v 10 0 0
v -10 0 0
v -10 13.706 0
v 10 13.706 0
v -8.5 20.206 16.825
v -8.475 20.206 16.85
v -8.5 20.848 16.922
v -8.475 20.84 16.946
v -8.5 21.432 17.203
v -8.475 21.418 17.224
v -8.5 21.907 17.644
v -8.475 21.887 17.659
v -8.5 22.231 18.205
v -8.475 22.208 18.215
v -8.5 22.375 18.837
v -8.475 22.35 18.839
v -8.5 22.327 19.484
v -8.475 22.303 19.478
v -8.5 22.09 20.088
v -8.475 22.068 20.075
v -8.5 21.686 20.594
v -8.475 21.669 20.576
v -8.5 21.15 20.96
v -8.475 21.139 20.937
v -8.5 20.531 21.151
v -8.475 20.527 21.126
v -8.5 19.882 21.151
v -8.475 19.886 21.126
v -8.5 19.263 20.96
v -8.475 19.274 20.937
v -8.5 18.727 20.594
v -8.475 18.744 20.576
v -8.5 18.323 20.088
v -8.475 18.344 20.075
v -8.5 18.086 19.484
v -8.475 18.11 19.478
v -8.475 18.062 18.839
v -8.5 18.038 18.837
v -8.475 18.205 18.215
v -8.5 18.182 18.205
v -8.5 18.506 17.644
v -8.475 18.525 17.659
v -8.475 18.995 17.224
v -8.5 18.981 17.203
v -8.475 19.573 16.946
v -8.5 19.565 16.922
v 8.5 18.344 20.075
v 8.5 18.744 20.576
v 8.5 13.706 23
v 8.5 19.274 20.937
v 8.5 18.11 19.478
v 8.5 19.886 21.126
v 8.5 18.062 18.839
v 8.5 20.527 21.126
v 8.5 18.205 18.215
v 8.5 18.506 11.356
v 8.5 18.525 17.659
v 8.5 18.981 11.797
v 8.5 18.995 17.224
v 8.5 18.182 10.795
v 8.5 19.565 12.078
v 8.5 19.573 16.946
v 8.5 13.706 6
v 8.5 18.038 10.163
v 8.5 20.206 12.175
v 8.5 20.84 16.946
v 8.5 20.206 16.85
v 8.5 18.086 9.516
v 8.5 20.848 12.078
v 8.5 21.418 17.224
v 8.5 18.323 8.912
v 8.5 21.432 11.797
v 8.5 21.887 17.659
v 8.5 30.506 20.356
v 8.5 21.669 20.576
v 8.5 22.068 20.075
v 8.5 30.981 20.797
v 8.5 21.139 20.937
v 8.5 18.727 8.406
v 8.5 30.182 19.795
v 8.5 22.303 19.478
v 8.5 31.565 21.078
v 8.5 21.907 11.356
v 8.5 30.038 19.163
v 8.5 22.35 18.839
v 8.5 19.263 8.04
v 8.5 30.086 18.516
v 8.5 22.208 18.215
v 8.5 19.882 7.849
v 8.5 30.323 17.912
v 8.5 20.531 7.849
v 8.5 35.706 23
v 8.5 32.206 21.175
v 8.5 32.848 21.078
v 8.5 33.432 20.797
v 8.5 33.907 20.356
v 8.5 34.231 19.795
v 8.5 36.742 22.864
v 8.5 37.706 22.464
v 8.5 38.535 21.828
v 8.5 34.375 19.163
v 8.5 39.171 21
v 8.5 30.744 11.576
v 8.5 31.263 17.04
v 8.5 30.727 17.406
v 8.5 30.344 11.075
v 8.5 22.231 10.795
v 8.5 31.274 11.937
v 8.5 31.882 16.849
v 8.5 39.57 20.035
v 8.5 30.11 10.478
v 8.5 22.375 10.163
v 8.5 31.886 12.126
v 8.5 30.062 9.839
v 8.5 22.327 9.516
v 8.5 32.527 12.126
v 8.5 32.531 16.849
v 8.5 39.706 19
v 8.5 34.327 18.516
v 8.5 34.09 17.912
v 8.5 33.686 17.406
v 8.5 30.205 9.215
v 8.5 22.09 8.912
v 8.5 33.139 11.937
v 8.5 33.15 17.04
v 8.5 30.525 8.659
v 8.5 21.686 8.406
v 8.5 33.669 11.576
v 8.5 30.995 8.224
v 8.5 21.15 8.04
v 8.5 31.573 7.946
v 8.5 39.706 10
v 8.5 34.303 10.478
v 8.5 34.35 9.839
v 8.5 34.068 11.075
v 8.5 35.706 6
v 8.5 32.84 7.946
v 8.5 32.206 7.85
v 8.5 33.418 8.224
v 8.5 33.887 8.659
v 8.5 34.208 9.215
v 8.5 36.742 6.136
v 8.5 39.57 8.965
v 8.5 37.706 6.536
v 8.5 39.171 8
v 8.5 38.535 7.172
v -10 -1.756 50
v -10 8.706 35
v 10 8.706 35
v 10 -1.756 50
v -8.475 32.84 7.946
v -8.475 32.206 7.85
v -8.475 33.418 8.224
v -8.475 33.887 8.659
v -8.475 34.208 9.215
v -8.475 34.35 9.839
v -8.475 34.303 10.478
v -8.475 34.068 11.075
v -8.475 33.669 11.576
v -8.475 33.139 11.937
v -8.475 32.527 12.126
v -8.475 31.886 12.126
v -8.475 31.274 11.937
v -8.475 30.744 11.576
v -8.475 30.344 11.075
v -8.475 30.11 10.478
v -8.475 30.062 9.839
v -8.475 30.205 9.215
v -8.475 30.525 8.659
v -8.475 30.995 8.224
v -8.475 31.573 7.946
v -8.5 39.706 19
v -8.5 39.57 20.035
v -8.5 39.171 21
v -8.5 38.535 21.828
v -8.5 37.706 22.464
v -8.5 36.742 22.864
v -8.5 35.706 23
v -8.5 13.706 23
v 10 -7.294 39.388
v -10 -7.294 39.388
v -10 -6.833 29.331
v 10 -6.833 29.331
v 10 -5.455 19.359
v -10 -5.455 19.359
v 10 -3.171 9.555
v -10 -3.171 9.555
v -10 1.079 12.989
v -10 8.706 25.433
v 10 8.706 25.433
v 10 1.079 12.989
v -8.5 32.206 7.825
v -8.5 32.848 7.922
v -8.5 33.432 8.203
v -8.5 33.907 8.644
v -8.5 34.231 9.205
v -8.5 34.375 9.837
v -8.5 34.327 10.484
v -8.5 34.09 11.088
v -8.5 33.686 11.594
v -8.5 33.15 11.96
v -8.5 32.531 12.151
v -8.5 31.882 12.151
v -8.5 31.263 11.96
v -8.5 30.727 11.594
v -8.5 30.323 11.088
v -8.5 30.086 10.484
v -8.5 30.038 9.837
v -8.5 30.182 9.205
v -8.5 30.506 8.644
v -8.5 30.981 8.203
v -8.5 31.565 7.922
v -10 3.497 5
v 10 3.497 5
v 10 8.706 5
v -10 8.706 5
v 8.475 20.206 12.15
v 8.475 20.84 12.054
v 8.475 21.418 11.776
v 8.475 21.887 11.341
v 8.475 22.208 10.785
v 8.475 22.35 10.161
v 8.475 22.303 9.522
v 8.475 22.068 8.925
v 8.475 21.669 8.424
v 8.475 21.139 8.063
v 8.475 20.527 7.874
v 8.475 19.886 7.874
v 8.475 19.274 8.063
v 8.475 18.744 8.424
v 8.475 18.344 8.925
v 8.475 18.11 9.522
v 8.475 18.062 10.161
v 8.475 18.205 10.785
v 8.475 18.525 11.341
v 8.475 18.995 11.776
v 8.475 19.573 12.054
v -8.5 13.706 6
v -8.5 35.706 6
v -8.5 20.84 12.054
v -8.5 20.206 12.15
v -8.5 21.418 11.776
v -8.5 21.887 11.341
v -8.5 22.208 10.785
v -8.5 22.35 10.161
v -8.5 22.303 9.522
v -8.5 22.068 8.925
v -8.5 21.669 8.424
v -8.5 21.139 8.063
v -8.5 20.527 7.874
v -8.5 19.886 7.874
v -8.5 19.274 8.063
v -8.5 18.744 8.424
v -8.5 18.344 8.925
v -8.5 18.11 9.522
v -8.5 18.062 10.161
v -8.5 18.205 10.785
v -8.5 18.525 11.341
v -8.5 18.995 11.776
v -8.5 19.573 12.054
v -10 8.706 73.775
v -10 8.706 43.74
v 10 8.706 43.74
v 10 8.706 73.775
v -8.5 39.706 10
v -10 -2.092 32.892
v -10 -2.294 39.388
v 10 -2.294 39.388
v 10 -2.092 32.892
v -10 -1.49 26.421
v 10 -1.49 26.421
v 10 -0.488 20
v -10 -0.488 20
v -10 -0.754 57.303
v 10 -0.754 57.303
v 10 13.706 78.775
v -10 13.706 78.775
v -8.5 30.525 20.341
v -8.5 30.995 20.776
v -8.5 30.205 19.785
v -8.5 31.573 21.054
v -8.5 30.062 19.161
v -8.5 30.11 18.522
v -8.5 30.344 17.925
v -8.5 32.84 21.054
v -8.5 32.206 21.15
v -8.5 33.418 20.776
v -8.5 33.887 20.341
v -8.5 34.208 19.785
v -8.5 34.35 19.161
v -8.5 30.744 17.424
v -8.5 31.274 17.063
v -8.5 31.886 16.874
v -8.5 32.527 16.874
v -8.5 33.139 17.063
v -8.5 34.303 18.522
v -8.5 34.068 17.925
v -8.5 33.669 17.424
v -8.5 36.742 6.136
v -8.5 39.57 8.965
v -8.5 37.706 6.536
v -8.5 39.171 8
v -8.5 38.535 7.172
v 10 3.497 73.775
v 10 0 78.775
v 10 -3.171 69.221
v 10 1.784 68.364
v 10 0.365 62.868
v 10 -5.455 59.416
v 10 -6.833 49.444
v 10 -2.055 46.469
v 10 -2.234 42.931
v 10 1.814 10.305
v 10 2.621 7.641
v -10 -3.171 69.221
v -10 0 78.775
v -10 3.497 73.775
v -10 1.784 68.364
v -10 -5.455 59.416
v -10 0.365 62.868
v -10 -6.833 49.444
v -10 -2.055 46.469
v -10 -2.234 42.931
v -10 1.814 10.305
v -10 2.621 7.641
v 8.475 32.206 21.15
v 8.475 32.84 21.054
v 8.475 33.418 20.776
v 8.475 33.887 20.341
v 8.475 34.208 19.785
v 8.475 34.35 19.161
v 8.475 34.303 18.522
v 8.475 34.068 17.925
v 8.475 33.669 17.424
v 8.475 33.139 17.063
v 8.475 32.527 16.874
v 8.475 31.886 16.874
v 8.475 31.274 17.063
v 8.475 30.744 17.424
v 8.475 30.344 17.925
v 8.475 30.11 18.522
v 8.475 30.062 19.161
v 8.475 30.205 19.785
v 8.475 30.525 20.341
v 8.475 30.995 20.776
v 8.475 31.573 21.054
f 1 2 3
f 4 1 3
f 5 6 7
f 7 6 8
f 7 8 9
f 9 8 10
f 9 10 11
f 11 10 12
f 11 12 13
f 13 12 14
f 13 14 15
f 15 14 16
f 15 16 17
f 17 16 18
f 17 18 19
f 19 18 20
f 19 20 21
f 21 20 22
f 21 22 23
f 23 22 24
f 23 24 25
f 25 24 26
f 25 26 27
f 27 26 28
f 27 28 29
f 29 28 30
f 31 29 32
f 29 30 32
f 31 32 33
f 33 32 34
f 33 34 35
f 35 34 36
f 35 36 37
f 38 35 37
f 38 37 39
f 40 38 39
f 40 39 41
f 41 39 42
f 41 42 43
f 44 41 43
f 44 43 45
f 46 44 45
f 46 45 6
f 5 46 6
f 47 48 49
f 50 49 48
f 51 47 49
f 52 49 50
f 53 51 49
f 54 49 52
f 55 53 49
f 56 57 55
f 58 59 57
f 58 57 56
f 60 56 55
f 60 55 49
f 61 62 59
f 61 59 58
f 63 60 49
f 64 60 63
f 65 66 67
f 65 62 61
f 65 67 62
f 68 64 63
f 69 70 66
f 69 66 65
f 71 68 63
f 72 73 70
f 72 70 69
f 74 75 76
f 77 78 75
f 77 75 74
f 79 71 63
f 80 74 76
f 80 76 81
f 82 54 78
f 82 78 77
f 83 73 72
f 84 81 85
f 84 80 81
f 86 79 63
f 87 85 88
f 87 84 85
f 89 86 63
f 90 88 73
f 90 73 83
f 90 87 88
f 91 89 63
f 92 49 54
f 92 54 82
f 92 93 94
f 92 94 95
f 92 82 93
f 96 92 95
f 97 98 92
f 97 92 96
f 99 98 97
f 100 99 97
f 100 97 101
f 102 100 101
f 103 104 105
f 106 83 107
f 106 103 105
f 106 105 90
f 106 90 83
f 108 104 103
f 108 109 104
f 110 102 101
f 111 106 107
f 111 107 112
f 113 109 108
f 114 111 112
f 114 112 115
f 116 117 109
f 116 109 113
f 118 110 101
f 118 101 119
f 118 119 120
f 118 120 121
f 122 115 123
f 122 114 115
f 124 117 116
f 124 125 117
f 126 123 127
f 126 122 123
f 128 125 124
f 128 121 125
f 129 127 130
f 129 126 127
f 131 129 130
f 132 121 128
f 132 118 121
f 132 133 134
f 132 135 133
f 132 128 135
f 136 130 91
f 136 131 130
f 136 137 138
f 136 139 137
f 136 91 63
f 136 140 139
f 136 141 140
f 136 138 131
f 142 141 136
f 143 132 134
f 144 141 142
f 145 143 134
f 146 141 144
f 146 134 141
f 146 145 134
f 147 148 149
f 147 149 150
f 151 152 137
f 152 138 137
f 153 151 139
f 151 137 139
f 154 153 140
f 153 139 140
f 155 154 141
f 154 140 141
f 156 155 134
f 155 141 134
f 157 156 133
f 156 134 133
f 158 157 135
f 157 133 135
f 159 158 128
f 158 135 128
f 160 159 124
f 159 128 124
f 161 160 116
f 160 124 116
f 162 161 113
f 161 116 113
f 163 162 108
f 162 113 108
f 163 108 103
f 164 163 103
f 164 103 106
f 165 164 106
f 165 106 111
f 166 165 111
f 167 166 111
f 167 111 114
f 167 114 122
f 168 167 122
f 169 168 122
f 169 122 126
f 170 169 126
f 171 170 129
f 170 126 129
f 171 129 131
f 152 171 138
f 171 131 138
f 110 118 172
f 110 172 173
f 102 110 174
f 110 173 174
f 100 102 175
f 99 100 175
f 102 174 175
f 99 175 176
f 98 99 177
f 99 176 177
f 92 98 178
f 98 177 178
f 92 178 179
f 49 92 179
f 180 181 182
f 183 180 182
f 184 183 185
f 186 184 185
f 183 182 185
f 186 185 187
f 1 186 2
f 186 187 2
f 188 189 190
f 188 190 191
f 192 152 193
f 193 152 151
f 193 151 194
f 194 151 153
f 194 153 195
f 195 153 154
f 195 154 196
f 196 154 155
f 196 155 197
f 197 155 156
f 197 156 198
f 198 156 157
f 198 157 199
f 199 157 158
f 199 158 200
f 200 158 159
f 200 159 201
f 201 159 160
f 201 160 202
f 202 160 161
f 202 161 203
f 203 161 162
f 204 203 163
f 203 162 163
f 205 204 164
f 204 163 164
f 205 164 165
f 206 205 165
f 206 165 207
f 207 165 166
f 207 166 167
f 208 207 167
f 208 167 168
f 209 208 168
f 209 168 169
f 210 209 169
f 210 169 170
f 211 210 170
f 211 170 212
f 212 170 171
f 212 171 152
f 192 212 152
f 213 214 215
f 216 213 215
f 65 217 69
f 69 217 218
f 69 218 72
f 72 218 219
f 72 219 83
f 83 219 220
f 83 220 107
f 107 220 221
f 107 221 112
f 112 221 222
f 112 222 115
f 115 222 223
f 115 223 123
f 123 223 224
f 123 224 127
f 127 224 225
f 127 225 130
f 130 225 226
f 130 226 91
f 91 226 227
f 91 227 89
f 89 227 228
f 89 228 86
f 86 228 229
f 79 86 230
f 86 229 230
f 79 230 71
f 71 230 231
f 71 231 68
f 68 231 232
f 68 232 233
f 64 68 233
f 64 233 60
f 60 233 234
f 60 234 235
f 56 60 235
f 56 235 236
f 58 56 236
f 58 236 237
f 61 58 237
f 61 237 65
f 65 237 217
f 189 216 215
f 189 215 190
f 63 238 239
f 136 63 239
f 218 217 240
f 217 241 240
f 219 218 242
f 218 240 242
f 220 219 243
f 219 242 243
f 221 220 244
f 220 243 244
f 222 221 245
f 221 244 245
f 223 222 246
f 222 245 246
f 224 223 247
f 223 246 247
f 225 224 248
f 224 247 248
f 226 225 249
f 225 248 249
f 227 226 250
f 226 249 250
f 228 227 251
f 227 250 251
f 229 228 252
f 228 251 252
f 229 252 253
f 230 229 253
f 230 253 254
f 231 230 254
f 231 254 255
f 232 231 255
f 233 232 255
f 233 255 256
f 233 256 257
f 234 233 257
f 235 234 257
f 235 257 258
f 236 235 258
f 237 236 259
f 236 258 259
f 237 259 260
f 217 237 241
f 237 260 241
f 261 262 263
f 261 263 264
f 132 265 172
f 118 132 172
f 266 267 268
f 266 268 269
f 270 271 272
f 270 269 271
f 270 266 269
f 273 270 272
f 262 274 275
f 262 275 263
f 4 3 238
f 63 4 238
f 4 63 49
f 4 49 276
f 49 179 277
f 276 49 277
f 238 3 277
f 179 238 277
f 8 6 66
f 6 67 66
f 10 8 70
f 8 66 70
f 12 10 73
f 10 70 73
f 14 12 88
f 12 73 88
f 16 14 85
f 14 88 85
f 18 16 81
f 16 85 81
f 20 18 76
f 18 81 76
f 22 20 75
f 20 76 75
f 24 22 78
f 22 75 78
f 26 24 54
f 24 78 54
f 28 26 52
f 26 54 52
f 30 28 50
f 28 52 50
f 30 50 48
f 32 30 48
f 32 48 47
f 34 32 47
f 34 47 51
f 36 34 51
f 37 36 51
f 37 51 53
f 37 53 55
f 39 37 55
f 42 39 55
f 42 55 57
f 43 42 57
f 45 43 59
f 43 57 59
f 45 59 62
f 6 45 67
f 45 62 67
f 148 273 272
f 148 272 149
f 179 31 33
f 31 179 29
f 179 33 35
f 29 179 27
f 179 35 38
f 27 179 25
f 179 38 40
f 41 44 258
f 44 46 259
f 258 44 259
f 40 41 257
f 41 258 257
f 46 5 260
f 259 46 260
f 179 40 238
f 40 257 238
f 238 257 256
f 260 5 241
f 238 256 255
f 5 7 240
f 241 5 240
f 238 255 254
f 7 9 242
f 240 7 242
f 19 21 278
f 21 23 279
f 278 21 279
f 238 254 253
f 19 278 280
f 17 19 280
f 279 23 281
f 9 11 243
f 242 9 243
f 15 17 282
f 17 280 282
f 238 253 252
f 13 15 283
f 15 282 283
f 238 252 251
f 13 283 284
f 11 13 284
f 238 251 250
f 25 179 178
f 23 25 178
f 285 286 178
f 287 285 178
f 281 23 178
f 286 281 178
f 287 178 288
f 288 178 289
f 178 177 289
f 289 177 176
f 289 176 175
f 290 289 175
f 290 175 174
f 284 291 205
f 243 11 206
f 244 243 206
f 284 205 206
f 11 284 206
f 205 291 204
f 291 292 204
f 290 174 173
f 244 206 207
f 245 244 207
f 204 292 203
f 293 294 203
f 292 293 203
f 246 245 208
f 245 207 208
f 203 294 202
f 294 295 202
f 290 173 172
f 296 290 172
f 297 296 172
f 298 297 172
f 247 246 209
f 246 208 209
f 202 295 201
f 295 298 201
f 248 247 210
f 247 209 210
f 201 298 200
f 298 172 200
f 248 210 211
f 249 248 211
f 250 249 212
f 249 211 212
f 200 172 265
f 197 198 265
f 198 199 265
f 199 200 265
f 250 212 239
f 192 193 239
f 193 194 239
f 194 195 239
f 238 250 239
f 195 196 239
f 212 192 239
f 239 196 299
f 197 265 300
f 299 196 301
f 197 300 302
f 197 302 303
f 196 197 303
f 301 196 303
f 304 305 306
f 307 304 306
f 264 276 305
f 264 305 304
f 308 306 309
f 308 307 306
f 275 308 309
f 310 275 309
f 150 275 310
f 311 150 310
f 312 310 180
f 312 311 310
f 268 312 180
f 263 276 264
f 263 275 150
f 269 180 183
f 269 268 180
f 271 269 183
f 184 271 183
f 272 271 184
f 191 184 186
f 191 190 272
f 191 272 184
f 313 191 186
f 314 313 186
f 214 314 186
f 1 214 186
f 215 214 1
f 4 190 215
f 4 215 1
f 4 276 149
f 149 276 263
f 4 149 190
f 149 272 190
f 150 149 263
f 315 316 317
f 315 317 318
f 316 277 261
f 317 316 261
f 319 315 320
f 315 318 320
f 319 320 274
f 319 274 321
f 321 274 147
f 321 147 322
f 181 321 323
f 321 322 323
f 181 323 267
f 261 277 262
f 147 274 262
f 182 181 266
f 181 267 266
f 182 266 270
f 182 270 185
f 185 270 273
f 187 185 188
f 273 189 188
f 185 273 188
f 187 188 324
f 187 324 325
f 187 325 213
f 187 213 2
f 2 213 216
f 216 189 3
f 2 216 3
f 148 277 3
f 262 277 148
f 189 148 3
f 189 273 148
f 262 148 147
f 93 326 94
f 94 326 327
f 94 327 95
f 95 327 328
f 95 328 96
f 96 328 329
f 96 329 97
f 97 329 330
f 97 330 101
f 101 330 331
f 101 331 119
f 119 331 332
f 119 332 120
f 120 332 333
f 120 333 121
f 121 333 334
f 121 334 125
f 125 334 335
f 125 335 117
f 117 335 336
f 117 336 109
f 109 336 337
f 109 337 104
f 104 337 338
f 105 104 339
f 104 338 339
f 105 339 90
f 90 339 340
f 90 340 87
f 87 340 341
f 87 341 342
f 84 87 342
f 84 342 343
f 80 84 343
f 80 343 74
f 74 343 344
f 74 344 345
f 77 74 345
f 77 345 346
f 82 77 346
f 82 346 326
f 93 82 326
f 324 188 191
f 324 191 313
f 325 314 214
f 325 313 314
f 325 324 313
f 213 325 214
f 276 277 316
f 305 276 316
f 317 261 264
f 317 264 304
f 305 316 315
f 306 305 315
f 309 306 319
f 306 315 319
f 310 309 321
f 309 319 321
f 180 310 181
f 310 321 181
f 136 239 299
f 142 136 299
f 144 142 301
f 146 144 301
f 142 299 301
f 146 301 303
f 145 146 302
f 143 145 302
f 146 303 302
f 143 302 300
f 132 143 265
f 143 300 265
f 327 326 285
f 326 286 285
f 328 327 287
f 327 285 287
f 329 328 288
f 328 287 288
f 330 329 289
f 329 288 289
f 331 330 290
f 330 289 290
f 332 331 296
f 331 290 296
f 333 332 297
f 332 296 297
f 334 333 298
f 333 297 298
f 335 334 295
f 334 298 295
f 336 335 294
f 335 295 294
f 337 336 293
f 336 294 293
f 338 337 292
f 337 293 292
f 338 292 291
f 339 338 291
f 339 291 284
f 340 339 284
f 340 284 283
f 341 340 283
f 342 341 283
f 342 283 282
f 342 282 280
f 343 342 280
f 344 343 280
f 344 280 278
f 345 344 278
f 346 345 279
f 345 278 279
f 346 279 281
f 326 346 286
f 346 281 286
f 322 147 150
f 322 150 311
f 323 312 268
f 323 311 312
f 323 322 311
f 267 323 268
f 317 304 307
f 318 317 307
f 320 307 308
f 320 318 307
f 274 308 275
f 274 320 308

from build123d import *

# Parameters (mm, degrees)
BOSS_EXTRUDE1_DEPTH            = 10
BOSS_EXTRUDE1_DEPTH_BACK       = 10
BOSS_EXTRUDE2_START            = -8.5
BOSS_EXTRUDE2_DEPTH            = 17
M4_CLEARANCE_HOLE1_D           = 4.3
M4_CLEARANCE_HOLE1_CSINK_D     = 4.35
M4_CLEARANCE_HOLE1_CSINK_ANGLE = 90
M4_CLEARANCE_HOLE2_D           = 4.3
M4_CLEARANCE_HOLE2_CSINK_D     = 4.35
M4_CLEARANCE_HOLE2_CSINK_ANGLE = 90
CUT_EXTRUDE1_DEPTH             = 89.78154726
CUT_EXTRUDE1_DEPTH_BACK        = 89.78154726


with BuildPart() as part:
    # Sketch2 → Boss-Extrude1 (new, two sides: drawn at the far end of the back side and taken through both)
    with BuildSketch(Plane(origin=(0, 0, 0), x_dir=(0, 0, -1), z_dir=(1, 0, 0)).offset(-BOSS_EXTRUDE1_DEPTH_BACK)):
        with BuildLine():
            Line((0, 13.70642245), (-6, 13.70642245))
            Line((-6, 13.70642245), (-23, 13.70642245))
            Line((-23, 13.70642245), (-78.775396858, 13.70642245))
            Line((-78.775396858, 13.70642245), (-78.775396858, 0))
            ThreePointArc((-78.775396858, 0), (-59.416347042, -5.45481476), (-39.387698429, -7.29357755))
            ThreePointArc((-39.387698429, -7.29357755), (-19.359049816, -5.45481476), (0, 0))
            Line((0, 0), (0, 13.70642245))
        make_face()
    extrude(amount=BOSS_EXTRUDE1_DEPTH + BOSS_EXTRUDE1_DEPTH_BACK)

    # Sketch2<3> → Boss-Extrude2 (add)
    with BuildSketch(Plane(origin=(0, 0, 0), x_dir=(0, 0, -1), z_dir=(1, 0, 0)).offset(BOSS_EXTRUDE2_START)):
        with BuildLine():
            Line((-23, 13.70642245), (-6, 13.70642245))
            Line((-6, 13.70642245), (-6, 35.706422449))
            ThreePointArc((-6, 35.706422449), (-7.171572875, 38.534849574), (-10, 39.706422449))
            Line((-10, 39.706422449), (-19, 39.706422449))
            ThreePointArc((-19, 39.706422449), (-21.828427125, 38.534849574), (-23, 35.706422449))
            Line((-23, 35.706422449), (-23, 28.706422449))
            Line((-23, 28.706422449), (-23, 23.70642245))
            Line((-23, 23.70642245), (-23, 16.70642245))
            Line((-23, 16.70642245), (-23, 13.70642245))
        make_face()
    extrude(amount=BOSS_EXTRUDE2_DEPTH)

    # M4 Clearance Hole1 (through all)
    with Locations(Plane.ZY.offset(8.5)):
        with Locations((10, 32.206422449), (19, 20.20642245)):
            CounterSinkHole(M4_CLEARANCE_HOLE1_D / 2, M4_CLEARANCE_HOLE1_CSINK_D / 2, counter_sink_angle=M4_CLEARANCE_HOLE1_CSINK_ANGLE)

    # M4 Clearance Hole2 (through all)
    with Locations(Plane(origin=(8.5, 0, 0), x_dir=(0, 0, -1), z_dir=(1, 0, 0))):
        with Locations((-19, 32.206422449), (-10, 20.20642245)):
            CounterSinkHole(M4_CLEARANCE_HOLE2_D / 2, M4_CLEARANCE_HOLE2_CSINK_D / 2, counter_sink_angle=M4_CLEARANCE_HOLE2_CSINK_ANGLE)

    # Sketch8 → Cut-Extrude1 (cut, two sides: drawn at the far end of the back side and taken through both)
    with BuildSketch(Plane(origin=(0, 0, 0), x_dir=(0, 0, -1), z_dir=(1, 0, 0)).offset(-CUT_EXTRUDE1_DEPTH_BACK)):
        with BuildLine():
            Line((-5, 3.497117459), (-5, 8.70642245))
            Line((-5, 8.70642245), (-6, 8.70642245))
            Line((-6, 8.70642245), (-23, 8.70642245))
            Line((-23, 8.70642245), (-25.432523452, 8.70642245))
            Line((-25.432523452, 8.70642245), (-12.989242433, 1.079056445))
            ThreePointArc((-12.989242433, 1.079056445), (-8.970583227, 2.208665745), (-5, 3.497117459))
        make_face()
        with BuildLine():
            ThreePointArc((-39.387698429, -2.29357755), (-29.651907949, -1.841243156), (-20, -0.48813724))
            Line((-20, -0.48813724), (-35, 8.70642245))
            Line((-35, 8.70642245), (-50, -1.755910739))
            ThreePointArc((-50, -1.755910739), (-44.700655003, -2.1590747), (-39.387698429, -2.29357755))
        make_face()
        with BuildLine():
            Line((-57.303381238, -0.753851614), (-43.740048051, 8.70642245))
            Line((-43.740048051, 8.70642245), (-73.775396858, 8.70642245))
            Line((-73.775396858, 8.70642245), (-73.775396858, 3.497117459))
            ThreePointArc((-73.775396858, 3.497117459), (-65.625621494, 1.037492126), (-57.303381238, -0.753851614))
        make_face()
    extrude(amount=CUT_EXTRUDE1_DEPTH + CUT_EXTRUDE1_DEPTH_BACK, mode=Mode.SUBTRACT)


solid = part.part
